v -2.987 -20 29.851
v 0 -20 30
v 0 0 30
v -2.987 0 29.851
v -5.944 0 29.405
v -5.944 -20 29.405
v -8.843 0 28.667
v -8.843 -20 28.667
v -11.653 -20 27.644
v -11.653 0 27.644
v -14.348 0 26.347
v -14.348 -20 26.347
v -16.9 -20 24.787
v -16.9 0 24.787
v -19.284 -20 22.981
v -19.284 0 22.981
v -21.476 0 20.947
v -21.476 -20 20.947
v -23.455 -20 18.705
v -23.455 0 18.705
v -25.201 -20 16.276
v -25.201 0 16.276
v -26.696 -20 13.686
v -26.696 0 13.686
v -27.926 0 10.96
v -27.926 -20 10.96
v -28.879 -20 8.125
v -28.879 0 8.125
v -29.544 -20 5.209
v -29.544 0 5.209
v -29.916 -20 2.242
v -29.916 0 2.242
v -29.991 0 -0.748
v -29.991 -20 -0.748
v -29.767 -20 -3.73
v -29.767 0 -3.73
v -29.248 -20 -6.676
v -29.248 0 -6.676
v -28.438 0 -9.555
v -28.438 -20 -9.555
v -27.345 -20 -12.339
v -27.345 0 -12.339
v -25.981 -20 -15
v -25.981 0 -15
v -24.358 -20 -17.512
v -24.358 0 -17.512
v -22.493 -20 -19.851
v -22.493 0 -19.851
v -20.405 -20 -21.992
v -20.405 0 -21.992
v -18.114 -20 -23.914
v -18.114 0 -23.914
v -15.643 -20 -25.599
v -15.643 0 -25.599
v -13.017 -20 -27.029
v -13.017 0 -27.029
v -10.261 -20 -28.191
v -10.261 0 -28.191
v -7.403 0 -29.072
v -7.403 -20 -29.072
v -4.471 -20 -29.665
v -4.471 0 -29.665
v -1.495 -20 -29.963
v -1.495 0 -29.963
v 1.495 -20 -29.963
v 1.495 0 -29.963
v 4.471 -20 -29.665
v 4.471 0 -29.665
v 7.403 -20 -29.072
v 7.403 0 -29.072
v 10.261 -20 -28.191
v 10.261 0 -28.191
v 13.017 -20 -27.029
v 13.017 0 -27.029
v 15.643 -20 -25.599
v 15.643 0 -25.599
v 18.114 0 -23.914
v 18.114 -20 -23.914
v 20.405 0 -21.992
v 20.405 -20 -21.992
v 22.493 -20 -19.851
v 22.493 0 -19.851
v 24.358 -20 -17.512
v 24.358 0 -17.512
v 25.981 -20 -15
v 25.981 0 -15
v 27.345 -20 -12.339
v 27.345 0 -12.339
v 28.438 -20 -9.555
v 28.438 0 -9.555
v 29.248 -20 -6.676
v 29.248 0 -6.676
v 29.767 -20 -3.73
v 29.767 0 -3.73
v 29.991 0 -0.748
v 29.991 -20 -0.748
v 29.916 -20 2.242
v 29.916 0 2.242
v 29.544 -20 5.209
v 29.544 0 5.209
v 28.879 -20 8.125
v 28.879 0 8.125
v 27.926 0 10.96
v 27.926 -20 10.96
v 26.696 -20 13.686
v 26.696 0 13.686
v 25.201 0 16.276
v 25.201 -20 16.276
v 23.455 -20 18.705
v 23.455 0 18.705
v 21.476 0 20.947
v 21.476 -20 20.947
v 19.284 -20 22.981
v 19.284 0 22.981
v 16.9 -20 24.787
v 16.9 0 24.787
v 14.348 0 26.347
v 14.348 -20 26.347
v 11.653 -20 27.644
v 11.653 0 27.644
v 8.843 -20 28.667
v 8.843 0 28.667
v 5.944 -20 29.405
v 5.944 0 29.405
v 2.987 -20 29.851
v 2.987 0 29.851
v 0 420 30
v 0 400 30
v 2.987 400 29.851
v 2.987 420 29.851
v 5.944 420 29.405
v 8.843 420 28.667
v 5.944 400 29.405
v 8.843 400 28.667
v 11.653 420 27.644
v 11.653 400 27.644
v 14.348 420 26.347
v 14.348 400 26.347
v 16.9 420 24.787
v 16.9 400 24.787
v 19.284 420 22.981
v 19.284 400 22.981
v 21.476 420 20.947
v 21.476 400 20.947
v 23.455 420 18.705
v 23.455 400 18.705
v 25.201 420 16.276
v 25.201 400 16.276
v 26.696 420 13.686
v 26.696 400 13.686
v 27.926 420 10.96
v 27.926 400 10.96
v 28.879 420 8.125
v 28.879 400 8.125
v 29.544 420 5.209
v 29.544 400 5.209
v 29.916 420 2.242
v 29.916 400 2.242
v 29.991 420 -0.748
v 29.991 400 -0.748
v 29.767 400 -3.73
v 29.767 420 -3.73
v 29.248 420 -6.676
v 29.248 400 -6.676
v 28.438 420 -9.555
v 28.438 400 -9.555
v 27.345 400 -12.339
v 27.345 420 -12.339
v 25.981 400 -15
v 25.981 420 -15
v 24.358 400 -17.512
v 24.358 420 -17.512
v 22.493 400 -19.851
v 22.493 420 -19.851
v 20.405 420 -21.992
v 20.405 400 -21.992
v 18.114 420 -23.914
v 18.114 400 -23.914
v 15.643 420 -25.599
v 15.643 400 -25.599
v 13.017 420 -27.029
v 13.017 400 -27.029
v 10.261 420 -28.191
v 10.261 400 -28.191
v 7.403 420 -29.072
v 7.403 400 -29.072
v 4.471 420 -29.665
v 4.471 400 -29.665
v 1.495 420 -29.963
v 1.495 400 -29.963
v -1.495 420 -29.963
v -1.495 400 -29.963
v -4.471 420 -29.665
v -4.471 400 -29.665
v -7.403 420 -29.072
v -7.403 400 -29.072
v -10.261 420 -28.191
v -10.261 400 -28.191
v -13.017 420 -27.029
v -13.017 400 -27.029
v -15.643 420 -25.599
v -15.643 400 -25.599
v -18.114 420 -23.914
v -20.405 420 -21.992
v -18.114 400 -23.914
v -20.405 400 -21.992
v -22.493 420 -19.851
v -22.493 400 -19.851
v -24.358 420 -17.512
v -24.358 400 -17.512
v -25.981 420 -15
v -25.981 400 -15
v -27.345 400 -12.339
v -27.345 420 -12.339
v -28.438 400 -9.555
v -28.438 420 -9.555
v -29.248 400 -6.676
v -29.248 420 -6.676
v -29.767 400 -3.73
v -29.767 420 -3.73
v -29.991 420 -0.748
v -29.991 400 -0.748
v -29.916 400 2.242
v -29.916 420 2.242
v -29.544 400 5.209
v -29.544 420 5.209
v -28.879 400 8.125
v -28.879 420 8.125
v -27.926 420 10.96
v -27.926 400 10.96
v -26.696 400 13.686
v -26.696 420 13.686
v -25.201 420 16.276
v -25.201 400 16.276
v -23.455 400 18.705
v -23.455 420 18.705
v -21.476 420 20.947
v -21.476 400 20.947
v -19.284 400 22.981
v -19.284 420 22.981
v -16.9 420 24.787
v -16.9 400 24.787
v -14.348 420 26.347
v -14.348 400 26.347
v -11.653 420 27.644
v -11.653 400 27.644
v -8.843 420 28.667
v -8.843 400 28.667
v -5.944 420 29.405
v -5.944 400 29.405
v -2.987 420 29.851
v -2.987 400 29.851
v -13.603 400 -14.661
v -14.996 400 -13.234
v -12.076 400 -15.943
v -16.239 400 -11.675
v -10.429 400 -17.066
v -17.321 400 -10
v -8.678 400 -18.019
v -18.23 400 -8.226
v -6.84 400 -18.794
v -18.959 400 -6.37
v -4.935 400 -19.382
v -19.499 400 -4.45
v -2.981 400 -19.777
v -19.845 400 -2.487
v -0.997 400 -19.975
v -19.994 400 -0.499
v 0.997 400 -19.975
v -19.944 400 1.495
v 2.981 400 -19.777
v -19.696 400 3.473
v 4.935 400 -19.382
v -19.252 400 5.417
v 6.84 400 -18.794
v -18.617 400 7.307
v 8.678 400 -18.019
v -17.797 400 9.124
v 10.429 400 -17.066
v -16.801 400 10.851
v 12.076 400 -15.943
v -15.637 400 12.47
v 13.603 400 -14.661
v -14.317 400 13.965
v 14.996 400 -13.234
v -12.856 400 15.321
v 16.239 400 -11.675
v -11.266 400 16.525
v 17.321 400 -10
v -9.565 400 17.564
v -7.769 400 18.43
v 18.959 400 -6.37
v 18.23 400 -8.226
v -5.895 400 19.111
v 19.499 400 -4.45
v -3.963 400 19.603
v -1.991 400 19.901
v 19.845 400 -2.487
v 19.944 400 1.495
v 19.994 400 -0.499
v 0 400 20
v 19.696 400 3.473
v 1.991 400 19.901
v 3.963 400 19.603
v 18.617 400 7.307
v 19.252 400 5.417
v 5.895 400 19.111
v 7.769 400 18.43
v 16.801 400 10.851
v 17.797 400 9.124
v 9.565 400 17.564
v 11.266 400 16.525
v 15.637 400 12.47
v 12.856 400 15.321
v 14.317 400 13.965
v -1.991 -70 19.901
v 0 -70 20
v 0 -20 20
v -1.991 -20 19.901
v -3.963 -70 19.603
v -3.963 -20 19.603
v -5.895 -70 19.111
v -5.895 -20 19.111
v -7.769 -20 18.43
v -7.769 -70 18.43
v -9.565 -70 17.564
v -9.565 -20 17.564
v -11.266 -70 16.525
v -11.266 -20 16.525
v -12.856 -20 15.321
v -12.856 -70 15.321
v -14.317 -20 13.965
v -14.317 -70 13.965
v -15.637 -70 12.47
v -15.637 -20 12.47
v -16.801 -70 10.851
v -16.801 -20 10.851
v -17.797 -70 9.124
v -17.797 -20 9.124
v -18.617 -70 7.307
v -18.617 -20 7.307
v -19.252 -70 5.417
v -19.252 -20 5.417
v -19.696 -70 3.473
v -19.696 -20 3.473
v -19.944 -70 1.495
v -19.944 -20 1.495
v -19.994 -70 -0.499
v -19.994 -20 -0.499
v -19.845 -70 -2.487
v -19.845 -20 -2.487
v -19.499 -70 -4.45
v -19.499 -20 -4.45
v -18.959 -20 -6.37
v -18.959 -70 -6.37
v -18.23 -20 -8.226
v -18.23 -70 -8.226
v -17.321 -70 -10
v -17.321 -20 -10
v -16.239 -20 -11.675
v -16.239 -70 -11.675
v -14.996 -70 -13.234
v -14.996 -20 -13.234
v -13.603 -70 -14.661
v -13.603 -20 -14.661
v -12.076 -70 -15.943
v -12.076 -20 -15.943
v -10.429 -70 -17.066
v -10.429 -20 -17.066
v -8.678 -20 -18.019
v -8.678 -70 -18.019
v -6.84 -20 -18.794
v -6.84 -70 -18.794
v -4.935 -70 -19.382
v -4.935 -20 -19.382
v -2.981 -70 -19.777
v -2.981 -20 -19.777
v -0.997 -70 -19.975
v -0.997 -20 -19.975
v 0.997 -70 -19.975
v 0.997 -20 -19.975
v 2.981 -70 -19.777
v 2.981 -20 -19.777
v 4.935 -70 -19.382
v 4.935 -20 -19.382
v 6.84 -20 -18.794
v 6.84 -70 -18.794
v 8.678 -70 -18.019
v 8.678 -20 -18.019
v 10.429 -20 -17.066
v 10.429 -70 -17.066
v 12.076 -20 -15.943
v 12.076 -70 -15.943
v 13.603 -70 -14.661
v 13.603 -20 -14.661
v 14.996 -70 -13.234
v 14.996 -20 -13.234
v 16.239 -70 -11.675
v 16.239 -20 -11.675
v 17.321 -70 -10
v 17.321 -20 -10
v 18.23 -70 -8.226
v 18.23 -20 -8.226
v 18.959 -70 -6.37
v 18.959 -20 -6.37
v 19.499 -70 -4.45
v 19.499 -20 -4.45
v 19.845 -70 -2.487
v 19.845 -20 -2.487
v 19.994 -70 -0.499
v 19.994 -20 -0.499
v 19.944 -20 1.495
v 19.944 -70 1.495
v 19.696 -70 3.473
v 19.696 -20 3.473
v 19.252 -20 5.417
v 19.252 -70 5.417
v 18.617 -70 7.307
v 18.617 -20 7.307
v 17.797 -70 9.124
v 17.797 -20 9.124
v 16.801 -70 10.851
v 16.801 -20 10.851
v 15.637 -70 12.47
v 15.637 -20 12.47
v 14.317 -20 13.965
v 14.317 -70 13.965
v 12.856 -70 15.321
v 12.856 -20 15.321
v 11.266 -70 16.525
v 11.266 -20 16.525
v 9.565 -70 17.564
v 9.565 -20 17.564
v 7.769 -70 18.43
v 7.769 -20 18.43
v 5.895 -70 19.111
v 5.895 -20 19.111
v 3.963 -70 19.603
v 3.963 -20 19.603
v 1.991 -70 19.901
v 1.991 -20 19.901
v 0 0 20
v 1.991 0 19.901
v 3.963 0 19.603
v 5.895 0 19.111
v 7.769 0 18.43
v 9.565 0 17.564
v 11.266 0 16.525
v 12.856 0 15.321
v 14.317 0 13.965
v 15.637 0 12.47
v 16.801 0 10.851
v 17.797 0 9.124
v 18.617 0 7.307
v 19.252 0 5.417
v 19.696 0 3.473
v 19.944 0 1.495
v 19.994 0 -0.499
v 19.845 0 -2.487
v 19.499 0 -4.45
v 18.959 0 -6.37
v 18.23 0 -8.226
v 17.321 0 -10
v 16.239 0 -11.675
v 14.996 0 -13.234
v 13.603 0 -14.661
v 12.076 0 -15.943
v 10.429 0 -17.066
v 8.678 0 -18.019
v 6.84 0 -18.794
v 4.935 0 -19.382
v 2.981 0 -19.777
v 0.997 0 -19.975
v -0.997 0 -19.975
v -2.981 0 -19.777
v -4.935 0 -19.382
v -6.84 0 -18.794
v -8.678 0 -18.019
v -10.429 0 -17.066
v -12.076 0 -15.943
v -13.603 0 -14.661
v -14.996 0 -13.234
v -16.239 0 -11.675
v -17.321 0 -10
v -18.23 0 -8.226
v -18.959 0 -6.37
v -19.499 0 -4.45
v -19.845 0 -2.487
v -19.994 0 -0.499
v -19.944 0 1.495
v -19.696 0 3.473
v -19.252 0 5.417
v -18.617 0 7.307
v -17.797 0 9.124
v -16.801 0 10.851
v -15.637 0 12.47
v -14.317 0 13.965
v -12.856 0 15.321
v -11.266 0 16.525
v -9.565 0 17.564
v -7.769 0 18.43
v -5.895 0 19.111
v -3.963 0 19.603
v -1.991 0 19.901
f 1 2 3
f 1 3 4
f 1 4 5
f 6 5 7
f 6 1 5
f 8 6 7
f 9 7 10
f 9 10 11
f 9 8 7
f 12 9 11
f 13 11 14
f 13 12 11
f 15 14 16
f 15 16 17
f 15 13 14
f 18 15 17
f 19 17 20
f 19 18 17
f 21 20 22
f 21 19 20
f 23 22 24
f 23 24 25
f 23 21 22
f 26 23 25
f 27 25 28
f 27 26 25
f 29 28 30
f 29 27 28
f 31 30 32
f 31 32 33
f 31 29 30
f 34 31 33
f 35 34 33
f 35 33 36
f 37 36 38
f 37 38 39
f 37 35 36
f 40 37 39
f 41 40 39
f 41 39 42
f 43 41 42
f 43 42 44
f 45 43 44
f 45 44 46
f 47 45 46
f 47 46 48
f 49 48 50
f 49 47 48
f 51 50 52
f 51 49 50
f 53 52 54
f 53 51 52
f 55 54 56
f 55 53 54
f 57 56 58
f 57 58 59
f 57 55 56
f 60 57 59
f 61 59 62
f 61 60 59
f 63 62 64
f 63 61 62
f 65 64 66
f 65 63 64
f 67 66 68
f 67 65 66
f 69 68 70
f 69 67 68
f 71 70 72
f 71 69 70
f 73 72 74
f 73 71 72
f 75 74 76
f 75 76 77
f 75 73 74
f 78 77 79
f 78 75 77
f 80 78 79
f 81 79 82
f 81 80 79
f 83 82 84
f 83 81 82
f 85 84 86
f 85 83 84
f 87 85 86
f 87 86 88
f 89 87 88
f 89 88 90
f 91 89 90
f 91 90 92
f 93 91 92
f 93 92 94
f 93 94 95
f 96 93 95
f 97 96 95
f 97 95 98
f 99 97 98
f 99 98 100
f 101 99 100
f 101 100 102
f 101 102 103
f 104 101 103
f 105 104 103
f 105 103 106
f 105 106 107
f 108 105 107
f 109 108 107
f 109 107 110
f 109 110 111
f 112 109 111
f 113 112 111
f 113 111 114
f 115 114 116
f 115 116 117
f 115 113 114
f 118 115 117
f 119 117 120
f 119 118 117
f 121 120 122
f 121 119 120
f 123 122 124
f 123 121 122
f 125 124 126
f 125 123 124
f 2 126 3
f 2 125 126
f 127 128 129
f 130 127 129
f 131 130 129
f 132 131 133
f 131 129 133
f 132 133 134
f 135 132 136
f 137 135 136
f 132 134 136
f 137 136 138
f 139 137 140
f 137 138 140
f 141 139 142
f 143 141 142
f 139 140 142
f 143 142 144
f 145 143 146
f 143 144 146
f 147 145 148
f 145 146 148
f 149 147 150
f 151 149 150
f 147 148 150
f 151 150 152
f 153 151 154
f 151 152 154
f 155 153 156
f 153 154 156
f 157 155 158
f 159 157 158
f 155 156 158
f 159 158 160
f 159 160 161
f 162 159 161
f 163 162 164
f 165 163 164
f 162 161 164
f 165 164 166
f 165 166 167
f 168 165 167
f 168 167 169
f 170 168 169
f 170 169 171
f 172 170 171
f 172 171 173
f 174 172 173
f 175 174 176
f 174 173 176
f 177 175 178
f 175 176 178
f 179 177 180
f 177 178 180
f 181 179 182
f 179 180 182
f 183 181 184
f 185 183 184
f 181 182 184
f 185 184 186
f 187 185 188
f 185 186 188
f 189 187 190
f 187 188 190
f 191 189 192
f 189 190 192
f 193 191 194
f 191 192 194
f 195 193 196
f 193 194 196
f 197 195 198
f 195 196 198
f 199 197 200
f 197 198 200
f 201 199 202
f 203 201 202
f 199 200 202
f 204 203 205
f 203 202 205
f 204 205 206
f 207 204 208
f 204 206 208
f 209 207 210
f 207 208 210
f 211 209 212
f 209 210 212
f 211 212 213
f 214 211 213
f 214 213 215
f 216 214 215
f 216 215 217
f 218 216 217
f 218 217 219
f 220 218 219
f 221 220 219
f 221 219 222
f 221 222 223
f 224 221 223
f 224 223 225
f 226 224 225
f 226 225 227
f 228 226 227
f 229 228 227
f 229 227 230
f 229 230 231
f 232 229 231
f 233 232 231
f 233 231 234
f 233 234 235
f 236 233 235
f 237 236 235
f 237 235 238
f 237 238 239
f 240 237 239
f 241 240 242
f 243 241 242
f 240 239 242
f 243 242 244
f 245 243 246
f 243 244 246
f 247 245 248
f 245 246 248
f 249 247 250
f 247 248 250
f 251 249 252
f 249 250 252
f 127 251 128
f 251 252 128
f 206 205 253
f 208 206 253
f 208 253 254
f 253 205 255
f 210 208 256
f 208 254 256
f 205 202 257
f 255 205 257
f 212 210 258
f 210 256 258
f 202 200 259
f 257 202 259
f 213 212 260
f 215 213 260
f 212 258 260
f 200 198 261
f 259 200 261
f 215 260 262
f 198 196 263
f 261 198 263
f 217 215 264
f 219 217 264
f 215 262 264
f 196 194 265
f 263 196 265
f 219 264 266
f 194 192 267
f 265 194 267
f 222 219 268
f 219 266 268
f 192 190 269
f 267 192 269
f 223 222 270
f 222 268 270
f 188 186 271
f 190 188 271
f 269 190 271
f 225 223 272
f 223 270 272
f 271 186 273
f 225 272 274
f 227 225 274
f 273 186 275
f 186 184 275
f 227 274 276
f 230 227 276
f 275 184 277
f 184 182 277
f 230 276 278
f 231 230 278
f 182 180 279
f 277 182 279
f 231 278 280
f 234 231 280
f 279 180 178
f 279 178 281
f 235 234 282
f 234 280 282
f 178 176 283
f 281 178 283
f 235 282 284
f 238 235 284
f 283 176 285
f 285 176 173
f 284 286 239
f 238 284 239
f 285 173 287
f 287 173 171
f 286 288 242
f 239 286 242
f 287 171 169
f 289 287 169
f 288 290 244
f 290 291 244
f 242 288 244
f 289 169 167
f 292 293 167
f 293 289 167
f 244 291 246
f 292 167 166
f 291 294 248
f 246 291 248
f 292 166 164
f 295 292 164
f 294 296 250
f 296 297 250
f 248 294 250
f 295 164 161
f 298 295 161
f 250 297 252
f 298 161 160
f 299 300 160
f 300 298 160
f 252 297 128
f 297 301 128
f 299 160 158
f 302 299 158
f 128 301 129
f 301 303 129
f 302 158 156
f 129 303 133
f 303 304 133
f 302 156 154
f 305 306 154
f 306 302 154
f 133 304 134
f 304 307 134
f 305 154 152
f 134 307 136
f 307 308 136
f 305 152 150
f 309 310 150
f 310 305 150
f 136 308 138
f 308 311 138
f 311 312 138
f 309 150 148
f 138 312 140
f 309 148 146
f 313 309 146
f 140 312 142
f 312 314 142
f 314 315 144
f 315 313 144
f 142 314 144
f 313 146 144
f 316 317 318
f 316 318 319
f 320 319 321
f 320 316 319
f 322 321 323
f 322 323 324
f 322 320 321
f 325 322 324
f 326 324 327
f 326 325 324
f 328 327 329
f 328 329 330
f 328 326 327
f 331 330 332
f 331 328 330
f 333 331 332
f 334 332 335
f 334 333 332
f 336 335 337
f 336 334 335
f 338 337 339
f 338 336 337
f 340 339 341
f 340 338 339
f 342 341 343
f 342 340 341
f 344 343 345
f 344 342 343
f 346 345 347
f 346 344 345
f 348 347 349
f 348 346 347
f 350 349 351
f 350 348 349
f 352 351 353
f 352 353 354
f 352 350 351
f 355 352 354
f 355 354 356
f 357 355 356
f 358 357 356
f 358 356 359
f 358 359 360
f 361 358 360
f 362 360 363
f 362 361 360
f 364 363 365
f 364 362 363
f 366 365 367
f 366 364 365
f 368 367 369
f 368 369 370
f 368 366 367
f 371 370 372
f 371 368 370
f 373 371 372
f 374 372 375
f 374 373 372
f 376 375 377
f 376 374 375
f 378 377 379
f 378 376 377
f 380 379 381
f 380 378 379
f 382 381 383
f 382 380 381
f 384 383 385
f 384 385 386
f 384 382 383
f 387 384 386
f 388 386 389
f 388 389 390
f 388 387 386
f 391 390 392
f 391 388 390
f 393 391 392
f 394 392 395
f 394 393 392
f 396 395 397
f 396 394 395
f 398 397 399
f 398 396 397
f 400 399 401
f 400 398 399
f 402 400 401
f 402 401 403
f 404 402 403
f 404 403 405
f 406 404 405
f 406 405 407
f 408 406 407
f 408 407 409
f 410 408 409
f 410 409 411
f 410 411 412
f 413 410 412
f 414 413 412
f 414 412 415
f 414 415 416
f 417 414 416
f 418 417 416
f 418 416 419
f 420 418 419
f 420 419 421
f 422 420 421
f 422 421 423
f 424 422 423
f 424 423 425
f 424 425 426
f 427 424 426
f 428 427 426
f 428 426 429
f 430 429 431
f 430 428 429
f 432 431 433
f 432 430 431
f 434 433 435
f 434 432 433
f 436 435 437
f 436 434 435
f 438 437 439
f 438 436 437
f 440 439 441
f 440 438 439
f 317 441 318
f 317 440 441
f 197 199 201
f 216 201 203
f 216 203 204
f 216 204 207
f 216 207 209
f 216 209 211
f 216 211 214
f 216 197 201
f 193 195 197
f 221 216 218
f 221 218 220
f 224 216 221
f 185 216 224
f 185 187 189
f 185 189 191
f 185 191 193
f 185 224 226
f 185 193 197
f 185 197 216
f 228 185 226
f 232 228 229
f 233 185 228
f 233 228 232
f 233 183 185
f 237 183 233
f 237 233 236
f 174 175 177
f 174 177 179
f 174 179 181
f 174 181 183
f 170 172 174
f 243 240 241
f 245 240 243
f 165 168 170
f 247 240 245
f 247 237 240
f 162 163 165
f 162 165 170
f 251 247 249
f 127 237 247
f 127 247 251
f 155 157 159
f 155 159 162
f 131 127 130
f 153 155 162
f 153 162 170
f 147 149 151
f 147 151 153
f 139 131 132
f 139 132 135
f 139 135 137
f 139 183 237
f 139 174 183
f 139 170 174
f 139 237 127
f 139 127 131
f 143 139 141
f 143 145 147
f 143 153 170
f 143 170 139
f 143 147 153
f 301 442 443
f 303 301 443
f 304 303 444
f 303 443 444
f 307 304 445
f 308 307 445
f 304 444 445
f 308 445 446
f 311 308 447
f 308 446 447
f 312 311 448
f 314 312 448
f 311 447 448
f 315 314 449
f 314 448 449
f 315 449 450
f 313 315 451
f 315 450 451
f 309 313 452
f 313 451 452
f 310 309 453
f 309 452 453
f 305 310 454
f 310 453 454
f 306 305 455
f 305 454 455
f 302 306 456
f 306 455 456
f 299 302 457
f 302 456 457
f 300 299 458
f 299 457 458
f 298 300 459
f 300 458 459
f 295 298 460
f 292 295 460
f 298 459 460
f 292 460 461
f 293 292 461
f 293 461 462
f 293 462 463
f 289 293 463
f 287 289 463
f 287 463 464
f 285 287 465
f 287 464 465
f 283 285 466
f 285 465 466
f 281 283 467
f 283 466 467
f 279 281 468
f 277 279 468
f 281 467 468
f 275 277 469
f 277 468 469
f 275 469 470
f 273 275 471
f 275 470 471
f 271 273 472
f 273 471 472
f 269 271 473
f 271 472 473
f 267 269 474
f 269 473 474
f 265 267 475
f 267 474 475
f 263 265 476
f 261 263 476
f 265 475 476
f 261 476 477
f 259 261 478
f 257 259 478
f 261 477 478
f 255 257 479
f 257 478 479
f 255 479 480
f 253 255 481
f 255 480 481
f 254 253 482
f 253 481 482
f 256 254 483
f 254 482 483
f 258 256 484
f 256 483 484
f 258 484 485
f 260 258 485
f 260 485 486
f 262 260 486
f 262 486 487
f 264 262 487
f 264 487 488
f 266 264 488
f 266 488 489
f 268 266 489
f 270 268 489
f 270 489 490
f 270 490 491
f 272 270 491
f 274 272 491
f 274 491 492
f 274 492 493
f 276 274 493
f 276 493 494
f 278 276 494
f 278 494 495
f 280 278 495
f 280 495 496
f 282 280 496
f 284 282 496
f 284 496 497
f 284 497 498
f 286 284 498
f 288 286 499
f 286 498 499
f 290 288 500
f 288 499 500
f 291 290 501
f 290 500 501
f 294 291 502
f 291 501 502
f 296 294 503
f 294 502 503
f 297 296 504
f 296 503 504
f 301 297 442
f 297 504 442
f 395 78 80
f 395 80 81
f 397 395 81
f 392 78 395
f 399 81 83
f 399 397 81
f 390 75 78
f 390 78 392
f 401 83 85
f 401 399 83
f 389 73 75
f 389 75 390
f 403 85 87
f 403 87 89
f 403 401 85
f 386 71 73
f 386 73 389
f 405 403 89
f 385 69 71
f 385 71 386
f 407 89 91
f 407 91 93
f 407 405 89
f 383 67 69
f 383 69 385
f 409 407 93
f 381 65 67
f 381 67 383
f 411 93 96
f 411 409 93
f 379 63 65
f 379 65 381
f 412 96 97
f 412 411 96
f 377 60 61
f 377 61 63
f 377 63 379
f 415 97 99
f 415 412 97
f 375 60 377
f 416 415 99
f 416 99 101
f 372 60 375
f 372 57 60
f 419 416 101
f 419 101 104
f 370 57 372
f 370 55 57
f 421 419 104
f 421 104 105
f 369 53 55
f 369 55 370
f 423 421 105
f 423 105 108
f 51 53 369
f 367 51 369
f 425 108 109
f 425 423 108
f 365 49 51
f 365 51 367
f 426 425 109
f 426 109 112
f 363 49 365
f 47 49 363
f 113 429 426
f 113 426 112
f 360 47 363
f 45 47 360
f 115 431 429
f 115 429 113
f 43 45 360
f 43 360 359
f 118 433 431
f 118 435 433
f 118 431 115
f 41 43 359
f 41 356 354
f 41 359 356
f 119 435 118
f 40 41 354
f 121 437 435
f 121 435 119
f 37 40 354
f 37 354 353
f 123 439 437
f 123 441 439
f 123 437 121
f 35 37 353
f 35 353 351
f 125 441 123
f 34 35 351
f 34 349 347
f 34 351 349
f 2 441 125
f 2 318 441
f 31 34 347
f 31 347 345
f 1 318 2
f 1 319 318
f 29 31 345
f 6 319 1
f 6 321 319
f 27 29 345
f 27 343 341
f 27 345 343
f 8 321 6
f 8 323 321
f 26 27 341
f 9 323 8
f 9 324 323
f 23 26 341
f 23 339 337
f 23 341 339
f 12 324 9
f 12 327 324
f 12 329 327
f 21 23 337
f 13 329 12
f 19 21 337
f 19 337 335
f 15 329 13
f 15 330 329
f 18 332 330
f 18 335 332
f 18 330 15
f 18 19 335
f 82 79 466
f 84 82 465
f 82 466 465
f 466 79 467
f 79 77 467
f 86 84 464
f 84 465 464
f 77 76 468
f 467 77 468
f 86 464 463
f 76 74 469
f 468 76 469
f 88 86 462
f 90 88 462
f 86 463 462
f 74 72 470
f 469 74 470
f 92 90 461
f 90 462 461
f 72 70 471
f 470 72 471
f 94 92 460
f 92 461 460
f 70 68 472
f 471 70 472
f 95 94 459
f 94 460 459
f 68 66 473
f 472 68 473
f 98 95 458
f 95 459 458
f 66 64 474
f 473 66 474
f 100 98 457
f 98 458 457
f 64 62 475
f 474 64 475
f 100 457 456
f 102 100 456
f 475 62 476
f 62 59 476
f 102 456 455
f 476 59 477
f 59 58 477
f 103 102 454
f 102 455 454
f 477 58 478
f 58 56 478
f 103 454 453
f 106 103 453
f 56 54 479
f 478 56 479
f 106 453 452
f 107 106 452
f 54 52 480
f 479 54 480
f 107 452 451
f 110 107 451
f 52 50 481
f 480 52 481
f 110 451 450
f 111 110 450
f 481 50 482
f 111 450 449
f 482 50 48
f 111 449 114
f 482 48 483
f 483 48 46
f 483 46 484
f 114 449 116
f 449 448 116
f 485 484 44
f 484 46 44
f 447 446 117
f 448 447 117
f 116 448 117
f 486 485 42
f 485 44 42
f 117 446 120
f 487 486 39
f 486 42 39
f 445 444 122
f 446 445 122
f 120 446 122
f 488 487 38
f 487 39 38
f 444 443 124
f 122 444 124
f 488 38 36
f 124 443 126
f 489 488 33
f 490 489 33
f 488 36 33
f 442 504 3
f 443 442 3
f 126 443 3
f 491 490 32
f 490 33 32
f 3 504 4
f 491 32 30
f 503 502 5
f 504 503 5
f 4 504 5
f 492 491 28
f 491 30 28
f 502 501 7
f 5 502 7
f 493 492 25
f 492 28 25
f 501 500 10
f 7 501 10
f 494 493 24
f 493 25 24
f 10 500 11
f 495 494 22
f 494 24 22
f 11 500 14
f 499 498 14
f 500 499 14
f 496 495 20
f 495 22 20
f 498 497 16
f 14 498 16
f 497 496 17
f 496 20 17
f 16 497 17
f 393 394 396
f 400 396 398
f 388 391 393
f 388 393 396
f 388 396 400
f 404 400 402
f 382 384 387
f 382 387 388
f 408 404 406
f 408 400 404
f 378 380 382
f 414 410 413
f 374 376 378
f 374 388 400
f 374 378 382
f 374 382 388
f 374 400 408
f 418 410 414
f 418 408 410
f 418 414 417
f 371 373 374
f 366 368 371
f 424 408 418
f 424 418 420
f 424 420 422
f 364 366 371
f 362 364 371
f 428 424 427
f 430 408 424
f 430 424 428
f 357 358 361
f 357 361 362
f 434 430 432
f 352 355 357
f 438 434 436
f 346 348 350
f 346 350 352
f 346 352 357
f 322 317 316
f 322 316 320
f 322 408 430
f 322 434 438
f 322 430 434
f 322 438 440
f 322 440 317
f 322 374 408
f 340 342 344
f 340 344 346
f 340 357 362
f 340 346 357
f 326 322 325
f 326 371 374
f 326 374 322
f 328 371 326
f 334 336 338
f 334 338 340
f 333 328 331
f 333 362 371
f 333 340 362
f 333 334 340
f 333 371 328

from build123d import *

# Parameters (mm, degrees)
SKETCH3_R           = 20
BOSS_EXTRUDE4_DEPTH = 400
SKETCH13_R          = 30
BOSS_EXTRUDE5_DEPTH = 20
BOSS_EXTRUDE6_START = 20
SKETCH14_R          = 30
BOSS_EXTRUDE6_DEPTH = 20
BOSS_EXTRUDE7_START = 50
SKETCH15_R          = 20
BOSS_EXTRUDE7_DEPTH = 50


with BuildPart() as part:
    # Sketch3 → Boss-Extrude4 (new body)
    with BuildSketch(Plane(origin=(0, 0, 0), x_dir=(1, 0, 0), z_dir=(0, 1, 0))):
        Circle(SKETCH3_R)
    extrude(amount=BOSS_EXTRUDE4_DEPTH)

    # Sketch13 → Boss-Extrude5 (add)
    with BuildSketch(Plane(origin=(0, 400, 0), x_dir=(1, 0, 0), z_dir=(0, 1, 0))):
        Circle(SKETCH13_R)
    extrude(amount=BOSS_EXTRUDE5_DEPTH)

    # Sketch14 → Boss-Extrude6 (add)
    with BuildSketch(Plane.XZ.offset(BOSS_EXTRUDE6_START)):
        Circle(SKETCH14_R)
    extrude(amount=-BOSS_EXTRUDE6_DEPTH)

    # Sketch15 → Boss-Extrude7 (add)
    with BuildSketch(Plane.XZ.offset(20).offset(BOSS_EXTRUDE7_START)):
        Circle(SKETCH15_R)
    extrude(amount=-BOSS_EXTRUDE7_DEPTH)


solid = part.part
